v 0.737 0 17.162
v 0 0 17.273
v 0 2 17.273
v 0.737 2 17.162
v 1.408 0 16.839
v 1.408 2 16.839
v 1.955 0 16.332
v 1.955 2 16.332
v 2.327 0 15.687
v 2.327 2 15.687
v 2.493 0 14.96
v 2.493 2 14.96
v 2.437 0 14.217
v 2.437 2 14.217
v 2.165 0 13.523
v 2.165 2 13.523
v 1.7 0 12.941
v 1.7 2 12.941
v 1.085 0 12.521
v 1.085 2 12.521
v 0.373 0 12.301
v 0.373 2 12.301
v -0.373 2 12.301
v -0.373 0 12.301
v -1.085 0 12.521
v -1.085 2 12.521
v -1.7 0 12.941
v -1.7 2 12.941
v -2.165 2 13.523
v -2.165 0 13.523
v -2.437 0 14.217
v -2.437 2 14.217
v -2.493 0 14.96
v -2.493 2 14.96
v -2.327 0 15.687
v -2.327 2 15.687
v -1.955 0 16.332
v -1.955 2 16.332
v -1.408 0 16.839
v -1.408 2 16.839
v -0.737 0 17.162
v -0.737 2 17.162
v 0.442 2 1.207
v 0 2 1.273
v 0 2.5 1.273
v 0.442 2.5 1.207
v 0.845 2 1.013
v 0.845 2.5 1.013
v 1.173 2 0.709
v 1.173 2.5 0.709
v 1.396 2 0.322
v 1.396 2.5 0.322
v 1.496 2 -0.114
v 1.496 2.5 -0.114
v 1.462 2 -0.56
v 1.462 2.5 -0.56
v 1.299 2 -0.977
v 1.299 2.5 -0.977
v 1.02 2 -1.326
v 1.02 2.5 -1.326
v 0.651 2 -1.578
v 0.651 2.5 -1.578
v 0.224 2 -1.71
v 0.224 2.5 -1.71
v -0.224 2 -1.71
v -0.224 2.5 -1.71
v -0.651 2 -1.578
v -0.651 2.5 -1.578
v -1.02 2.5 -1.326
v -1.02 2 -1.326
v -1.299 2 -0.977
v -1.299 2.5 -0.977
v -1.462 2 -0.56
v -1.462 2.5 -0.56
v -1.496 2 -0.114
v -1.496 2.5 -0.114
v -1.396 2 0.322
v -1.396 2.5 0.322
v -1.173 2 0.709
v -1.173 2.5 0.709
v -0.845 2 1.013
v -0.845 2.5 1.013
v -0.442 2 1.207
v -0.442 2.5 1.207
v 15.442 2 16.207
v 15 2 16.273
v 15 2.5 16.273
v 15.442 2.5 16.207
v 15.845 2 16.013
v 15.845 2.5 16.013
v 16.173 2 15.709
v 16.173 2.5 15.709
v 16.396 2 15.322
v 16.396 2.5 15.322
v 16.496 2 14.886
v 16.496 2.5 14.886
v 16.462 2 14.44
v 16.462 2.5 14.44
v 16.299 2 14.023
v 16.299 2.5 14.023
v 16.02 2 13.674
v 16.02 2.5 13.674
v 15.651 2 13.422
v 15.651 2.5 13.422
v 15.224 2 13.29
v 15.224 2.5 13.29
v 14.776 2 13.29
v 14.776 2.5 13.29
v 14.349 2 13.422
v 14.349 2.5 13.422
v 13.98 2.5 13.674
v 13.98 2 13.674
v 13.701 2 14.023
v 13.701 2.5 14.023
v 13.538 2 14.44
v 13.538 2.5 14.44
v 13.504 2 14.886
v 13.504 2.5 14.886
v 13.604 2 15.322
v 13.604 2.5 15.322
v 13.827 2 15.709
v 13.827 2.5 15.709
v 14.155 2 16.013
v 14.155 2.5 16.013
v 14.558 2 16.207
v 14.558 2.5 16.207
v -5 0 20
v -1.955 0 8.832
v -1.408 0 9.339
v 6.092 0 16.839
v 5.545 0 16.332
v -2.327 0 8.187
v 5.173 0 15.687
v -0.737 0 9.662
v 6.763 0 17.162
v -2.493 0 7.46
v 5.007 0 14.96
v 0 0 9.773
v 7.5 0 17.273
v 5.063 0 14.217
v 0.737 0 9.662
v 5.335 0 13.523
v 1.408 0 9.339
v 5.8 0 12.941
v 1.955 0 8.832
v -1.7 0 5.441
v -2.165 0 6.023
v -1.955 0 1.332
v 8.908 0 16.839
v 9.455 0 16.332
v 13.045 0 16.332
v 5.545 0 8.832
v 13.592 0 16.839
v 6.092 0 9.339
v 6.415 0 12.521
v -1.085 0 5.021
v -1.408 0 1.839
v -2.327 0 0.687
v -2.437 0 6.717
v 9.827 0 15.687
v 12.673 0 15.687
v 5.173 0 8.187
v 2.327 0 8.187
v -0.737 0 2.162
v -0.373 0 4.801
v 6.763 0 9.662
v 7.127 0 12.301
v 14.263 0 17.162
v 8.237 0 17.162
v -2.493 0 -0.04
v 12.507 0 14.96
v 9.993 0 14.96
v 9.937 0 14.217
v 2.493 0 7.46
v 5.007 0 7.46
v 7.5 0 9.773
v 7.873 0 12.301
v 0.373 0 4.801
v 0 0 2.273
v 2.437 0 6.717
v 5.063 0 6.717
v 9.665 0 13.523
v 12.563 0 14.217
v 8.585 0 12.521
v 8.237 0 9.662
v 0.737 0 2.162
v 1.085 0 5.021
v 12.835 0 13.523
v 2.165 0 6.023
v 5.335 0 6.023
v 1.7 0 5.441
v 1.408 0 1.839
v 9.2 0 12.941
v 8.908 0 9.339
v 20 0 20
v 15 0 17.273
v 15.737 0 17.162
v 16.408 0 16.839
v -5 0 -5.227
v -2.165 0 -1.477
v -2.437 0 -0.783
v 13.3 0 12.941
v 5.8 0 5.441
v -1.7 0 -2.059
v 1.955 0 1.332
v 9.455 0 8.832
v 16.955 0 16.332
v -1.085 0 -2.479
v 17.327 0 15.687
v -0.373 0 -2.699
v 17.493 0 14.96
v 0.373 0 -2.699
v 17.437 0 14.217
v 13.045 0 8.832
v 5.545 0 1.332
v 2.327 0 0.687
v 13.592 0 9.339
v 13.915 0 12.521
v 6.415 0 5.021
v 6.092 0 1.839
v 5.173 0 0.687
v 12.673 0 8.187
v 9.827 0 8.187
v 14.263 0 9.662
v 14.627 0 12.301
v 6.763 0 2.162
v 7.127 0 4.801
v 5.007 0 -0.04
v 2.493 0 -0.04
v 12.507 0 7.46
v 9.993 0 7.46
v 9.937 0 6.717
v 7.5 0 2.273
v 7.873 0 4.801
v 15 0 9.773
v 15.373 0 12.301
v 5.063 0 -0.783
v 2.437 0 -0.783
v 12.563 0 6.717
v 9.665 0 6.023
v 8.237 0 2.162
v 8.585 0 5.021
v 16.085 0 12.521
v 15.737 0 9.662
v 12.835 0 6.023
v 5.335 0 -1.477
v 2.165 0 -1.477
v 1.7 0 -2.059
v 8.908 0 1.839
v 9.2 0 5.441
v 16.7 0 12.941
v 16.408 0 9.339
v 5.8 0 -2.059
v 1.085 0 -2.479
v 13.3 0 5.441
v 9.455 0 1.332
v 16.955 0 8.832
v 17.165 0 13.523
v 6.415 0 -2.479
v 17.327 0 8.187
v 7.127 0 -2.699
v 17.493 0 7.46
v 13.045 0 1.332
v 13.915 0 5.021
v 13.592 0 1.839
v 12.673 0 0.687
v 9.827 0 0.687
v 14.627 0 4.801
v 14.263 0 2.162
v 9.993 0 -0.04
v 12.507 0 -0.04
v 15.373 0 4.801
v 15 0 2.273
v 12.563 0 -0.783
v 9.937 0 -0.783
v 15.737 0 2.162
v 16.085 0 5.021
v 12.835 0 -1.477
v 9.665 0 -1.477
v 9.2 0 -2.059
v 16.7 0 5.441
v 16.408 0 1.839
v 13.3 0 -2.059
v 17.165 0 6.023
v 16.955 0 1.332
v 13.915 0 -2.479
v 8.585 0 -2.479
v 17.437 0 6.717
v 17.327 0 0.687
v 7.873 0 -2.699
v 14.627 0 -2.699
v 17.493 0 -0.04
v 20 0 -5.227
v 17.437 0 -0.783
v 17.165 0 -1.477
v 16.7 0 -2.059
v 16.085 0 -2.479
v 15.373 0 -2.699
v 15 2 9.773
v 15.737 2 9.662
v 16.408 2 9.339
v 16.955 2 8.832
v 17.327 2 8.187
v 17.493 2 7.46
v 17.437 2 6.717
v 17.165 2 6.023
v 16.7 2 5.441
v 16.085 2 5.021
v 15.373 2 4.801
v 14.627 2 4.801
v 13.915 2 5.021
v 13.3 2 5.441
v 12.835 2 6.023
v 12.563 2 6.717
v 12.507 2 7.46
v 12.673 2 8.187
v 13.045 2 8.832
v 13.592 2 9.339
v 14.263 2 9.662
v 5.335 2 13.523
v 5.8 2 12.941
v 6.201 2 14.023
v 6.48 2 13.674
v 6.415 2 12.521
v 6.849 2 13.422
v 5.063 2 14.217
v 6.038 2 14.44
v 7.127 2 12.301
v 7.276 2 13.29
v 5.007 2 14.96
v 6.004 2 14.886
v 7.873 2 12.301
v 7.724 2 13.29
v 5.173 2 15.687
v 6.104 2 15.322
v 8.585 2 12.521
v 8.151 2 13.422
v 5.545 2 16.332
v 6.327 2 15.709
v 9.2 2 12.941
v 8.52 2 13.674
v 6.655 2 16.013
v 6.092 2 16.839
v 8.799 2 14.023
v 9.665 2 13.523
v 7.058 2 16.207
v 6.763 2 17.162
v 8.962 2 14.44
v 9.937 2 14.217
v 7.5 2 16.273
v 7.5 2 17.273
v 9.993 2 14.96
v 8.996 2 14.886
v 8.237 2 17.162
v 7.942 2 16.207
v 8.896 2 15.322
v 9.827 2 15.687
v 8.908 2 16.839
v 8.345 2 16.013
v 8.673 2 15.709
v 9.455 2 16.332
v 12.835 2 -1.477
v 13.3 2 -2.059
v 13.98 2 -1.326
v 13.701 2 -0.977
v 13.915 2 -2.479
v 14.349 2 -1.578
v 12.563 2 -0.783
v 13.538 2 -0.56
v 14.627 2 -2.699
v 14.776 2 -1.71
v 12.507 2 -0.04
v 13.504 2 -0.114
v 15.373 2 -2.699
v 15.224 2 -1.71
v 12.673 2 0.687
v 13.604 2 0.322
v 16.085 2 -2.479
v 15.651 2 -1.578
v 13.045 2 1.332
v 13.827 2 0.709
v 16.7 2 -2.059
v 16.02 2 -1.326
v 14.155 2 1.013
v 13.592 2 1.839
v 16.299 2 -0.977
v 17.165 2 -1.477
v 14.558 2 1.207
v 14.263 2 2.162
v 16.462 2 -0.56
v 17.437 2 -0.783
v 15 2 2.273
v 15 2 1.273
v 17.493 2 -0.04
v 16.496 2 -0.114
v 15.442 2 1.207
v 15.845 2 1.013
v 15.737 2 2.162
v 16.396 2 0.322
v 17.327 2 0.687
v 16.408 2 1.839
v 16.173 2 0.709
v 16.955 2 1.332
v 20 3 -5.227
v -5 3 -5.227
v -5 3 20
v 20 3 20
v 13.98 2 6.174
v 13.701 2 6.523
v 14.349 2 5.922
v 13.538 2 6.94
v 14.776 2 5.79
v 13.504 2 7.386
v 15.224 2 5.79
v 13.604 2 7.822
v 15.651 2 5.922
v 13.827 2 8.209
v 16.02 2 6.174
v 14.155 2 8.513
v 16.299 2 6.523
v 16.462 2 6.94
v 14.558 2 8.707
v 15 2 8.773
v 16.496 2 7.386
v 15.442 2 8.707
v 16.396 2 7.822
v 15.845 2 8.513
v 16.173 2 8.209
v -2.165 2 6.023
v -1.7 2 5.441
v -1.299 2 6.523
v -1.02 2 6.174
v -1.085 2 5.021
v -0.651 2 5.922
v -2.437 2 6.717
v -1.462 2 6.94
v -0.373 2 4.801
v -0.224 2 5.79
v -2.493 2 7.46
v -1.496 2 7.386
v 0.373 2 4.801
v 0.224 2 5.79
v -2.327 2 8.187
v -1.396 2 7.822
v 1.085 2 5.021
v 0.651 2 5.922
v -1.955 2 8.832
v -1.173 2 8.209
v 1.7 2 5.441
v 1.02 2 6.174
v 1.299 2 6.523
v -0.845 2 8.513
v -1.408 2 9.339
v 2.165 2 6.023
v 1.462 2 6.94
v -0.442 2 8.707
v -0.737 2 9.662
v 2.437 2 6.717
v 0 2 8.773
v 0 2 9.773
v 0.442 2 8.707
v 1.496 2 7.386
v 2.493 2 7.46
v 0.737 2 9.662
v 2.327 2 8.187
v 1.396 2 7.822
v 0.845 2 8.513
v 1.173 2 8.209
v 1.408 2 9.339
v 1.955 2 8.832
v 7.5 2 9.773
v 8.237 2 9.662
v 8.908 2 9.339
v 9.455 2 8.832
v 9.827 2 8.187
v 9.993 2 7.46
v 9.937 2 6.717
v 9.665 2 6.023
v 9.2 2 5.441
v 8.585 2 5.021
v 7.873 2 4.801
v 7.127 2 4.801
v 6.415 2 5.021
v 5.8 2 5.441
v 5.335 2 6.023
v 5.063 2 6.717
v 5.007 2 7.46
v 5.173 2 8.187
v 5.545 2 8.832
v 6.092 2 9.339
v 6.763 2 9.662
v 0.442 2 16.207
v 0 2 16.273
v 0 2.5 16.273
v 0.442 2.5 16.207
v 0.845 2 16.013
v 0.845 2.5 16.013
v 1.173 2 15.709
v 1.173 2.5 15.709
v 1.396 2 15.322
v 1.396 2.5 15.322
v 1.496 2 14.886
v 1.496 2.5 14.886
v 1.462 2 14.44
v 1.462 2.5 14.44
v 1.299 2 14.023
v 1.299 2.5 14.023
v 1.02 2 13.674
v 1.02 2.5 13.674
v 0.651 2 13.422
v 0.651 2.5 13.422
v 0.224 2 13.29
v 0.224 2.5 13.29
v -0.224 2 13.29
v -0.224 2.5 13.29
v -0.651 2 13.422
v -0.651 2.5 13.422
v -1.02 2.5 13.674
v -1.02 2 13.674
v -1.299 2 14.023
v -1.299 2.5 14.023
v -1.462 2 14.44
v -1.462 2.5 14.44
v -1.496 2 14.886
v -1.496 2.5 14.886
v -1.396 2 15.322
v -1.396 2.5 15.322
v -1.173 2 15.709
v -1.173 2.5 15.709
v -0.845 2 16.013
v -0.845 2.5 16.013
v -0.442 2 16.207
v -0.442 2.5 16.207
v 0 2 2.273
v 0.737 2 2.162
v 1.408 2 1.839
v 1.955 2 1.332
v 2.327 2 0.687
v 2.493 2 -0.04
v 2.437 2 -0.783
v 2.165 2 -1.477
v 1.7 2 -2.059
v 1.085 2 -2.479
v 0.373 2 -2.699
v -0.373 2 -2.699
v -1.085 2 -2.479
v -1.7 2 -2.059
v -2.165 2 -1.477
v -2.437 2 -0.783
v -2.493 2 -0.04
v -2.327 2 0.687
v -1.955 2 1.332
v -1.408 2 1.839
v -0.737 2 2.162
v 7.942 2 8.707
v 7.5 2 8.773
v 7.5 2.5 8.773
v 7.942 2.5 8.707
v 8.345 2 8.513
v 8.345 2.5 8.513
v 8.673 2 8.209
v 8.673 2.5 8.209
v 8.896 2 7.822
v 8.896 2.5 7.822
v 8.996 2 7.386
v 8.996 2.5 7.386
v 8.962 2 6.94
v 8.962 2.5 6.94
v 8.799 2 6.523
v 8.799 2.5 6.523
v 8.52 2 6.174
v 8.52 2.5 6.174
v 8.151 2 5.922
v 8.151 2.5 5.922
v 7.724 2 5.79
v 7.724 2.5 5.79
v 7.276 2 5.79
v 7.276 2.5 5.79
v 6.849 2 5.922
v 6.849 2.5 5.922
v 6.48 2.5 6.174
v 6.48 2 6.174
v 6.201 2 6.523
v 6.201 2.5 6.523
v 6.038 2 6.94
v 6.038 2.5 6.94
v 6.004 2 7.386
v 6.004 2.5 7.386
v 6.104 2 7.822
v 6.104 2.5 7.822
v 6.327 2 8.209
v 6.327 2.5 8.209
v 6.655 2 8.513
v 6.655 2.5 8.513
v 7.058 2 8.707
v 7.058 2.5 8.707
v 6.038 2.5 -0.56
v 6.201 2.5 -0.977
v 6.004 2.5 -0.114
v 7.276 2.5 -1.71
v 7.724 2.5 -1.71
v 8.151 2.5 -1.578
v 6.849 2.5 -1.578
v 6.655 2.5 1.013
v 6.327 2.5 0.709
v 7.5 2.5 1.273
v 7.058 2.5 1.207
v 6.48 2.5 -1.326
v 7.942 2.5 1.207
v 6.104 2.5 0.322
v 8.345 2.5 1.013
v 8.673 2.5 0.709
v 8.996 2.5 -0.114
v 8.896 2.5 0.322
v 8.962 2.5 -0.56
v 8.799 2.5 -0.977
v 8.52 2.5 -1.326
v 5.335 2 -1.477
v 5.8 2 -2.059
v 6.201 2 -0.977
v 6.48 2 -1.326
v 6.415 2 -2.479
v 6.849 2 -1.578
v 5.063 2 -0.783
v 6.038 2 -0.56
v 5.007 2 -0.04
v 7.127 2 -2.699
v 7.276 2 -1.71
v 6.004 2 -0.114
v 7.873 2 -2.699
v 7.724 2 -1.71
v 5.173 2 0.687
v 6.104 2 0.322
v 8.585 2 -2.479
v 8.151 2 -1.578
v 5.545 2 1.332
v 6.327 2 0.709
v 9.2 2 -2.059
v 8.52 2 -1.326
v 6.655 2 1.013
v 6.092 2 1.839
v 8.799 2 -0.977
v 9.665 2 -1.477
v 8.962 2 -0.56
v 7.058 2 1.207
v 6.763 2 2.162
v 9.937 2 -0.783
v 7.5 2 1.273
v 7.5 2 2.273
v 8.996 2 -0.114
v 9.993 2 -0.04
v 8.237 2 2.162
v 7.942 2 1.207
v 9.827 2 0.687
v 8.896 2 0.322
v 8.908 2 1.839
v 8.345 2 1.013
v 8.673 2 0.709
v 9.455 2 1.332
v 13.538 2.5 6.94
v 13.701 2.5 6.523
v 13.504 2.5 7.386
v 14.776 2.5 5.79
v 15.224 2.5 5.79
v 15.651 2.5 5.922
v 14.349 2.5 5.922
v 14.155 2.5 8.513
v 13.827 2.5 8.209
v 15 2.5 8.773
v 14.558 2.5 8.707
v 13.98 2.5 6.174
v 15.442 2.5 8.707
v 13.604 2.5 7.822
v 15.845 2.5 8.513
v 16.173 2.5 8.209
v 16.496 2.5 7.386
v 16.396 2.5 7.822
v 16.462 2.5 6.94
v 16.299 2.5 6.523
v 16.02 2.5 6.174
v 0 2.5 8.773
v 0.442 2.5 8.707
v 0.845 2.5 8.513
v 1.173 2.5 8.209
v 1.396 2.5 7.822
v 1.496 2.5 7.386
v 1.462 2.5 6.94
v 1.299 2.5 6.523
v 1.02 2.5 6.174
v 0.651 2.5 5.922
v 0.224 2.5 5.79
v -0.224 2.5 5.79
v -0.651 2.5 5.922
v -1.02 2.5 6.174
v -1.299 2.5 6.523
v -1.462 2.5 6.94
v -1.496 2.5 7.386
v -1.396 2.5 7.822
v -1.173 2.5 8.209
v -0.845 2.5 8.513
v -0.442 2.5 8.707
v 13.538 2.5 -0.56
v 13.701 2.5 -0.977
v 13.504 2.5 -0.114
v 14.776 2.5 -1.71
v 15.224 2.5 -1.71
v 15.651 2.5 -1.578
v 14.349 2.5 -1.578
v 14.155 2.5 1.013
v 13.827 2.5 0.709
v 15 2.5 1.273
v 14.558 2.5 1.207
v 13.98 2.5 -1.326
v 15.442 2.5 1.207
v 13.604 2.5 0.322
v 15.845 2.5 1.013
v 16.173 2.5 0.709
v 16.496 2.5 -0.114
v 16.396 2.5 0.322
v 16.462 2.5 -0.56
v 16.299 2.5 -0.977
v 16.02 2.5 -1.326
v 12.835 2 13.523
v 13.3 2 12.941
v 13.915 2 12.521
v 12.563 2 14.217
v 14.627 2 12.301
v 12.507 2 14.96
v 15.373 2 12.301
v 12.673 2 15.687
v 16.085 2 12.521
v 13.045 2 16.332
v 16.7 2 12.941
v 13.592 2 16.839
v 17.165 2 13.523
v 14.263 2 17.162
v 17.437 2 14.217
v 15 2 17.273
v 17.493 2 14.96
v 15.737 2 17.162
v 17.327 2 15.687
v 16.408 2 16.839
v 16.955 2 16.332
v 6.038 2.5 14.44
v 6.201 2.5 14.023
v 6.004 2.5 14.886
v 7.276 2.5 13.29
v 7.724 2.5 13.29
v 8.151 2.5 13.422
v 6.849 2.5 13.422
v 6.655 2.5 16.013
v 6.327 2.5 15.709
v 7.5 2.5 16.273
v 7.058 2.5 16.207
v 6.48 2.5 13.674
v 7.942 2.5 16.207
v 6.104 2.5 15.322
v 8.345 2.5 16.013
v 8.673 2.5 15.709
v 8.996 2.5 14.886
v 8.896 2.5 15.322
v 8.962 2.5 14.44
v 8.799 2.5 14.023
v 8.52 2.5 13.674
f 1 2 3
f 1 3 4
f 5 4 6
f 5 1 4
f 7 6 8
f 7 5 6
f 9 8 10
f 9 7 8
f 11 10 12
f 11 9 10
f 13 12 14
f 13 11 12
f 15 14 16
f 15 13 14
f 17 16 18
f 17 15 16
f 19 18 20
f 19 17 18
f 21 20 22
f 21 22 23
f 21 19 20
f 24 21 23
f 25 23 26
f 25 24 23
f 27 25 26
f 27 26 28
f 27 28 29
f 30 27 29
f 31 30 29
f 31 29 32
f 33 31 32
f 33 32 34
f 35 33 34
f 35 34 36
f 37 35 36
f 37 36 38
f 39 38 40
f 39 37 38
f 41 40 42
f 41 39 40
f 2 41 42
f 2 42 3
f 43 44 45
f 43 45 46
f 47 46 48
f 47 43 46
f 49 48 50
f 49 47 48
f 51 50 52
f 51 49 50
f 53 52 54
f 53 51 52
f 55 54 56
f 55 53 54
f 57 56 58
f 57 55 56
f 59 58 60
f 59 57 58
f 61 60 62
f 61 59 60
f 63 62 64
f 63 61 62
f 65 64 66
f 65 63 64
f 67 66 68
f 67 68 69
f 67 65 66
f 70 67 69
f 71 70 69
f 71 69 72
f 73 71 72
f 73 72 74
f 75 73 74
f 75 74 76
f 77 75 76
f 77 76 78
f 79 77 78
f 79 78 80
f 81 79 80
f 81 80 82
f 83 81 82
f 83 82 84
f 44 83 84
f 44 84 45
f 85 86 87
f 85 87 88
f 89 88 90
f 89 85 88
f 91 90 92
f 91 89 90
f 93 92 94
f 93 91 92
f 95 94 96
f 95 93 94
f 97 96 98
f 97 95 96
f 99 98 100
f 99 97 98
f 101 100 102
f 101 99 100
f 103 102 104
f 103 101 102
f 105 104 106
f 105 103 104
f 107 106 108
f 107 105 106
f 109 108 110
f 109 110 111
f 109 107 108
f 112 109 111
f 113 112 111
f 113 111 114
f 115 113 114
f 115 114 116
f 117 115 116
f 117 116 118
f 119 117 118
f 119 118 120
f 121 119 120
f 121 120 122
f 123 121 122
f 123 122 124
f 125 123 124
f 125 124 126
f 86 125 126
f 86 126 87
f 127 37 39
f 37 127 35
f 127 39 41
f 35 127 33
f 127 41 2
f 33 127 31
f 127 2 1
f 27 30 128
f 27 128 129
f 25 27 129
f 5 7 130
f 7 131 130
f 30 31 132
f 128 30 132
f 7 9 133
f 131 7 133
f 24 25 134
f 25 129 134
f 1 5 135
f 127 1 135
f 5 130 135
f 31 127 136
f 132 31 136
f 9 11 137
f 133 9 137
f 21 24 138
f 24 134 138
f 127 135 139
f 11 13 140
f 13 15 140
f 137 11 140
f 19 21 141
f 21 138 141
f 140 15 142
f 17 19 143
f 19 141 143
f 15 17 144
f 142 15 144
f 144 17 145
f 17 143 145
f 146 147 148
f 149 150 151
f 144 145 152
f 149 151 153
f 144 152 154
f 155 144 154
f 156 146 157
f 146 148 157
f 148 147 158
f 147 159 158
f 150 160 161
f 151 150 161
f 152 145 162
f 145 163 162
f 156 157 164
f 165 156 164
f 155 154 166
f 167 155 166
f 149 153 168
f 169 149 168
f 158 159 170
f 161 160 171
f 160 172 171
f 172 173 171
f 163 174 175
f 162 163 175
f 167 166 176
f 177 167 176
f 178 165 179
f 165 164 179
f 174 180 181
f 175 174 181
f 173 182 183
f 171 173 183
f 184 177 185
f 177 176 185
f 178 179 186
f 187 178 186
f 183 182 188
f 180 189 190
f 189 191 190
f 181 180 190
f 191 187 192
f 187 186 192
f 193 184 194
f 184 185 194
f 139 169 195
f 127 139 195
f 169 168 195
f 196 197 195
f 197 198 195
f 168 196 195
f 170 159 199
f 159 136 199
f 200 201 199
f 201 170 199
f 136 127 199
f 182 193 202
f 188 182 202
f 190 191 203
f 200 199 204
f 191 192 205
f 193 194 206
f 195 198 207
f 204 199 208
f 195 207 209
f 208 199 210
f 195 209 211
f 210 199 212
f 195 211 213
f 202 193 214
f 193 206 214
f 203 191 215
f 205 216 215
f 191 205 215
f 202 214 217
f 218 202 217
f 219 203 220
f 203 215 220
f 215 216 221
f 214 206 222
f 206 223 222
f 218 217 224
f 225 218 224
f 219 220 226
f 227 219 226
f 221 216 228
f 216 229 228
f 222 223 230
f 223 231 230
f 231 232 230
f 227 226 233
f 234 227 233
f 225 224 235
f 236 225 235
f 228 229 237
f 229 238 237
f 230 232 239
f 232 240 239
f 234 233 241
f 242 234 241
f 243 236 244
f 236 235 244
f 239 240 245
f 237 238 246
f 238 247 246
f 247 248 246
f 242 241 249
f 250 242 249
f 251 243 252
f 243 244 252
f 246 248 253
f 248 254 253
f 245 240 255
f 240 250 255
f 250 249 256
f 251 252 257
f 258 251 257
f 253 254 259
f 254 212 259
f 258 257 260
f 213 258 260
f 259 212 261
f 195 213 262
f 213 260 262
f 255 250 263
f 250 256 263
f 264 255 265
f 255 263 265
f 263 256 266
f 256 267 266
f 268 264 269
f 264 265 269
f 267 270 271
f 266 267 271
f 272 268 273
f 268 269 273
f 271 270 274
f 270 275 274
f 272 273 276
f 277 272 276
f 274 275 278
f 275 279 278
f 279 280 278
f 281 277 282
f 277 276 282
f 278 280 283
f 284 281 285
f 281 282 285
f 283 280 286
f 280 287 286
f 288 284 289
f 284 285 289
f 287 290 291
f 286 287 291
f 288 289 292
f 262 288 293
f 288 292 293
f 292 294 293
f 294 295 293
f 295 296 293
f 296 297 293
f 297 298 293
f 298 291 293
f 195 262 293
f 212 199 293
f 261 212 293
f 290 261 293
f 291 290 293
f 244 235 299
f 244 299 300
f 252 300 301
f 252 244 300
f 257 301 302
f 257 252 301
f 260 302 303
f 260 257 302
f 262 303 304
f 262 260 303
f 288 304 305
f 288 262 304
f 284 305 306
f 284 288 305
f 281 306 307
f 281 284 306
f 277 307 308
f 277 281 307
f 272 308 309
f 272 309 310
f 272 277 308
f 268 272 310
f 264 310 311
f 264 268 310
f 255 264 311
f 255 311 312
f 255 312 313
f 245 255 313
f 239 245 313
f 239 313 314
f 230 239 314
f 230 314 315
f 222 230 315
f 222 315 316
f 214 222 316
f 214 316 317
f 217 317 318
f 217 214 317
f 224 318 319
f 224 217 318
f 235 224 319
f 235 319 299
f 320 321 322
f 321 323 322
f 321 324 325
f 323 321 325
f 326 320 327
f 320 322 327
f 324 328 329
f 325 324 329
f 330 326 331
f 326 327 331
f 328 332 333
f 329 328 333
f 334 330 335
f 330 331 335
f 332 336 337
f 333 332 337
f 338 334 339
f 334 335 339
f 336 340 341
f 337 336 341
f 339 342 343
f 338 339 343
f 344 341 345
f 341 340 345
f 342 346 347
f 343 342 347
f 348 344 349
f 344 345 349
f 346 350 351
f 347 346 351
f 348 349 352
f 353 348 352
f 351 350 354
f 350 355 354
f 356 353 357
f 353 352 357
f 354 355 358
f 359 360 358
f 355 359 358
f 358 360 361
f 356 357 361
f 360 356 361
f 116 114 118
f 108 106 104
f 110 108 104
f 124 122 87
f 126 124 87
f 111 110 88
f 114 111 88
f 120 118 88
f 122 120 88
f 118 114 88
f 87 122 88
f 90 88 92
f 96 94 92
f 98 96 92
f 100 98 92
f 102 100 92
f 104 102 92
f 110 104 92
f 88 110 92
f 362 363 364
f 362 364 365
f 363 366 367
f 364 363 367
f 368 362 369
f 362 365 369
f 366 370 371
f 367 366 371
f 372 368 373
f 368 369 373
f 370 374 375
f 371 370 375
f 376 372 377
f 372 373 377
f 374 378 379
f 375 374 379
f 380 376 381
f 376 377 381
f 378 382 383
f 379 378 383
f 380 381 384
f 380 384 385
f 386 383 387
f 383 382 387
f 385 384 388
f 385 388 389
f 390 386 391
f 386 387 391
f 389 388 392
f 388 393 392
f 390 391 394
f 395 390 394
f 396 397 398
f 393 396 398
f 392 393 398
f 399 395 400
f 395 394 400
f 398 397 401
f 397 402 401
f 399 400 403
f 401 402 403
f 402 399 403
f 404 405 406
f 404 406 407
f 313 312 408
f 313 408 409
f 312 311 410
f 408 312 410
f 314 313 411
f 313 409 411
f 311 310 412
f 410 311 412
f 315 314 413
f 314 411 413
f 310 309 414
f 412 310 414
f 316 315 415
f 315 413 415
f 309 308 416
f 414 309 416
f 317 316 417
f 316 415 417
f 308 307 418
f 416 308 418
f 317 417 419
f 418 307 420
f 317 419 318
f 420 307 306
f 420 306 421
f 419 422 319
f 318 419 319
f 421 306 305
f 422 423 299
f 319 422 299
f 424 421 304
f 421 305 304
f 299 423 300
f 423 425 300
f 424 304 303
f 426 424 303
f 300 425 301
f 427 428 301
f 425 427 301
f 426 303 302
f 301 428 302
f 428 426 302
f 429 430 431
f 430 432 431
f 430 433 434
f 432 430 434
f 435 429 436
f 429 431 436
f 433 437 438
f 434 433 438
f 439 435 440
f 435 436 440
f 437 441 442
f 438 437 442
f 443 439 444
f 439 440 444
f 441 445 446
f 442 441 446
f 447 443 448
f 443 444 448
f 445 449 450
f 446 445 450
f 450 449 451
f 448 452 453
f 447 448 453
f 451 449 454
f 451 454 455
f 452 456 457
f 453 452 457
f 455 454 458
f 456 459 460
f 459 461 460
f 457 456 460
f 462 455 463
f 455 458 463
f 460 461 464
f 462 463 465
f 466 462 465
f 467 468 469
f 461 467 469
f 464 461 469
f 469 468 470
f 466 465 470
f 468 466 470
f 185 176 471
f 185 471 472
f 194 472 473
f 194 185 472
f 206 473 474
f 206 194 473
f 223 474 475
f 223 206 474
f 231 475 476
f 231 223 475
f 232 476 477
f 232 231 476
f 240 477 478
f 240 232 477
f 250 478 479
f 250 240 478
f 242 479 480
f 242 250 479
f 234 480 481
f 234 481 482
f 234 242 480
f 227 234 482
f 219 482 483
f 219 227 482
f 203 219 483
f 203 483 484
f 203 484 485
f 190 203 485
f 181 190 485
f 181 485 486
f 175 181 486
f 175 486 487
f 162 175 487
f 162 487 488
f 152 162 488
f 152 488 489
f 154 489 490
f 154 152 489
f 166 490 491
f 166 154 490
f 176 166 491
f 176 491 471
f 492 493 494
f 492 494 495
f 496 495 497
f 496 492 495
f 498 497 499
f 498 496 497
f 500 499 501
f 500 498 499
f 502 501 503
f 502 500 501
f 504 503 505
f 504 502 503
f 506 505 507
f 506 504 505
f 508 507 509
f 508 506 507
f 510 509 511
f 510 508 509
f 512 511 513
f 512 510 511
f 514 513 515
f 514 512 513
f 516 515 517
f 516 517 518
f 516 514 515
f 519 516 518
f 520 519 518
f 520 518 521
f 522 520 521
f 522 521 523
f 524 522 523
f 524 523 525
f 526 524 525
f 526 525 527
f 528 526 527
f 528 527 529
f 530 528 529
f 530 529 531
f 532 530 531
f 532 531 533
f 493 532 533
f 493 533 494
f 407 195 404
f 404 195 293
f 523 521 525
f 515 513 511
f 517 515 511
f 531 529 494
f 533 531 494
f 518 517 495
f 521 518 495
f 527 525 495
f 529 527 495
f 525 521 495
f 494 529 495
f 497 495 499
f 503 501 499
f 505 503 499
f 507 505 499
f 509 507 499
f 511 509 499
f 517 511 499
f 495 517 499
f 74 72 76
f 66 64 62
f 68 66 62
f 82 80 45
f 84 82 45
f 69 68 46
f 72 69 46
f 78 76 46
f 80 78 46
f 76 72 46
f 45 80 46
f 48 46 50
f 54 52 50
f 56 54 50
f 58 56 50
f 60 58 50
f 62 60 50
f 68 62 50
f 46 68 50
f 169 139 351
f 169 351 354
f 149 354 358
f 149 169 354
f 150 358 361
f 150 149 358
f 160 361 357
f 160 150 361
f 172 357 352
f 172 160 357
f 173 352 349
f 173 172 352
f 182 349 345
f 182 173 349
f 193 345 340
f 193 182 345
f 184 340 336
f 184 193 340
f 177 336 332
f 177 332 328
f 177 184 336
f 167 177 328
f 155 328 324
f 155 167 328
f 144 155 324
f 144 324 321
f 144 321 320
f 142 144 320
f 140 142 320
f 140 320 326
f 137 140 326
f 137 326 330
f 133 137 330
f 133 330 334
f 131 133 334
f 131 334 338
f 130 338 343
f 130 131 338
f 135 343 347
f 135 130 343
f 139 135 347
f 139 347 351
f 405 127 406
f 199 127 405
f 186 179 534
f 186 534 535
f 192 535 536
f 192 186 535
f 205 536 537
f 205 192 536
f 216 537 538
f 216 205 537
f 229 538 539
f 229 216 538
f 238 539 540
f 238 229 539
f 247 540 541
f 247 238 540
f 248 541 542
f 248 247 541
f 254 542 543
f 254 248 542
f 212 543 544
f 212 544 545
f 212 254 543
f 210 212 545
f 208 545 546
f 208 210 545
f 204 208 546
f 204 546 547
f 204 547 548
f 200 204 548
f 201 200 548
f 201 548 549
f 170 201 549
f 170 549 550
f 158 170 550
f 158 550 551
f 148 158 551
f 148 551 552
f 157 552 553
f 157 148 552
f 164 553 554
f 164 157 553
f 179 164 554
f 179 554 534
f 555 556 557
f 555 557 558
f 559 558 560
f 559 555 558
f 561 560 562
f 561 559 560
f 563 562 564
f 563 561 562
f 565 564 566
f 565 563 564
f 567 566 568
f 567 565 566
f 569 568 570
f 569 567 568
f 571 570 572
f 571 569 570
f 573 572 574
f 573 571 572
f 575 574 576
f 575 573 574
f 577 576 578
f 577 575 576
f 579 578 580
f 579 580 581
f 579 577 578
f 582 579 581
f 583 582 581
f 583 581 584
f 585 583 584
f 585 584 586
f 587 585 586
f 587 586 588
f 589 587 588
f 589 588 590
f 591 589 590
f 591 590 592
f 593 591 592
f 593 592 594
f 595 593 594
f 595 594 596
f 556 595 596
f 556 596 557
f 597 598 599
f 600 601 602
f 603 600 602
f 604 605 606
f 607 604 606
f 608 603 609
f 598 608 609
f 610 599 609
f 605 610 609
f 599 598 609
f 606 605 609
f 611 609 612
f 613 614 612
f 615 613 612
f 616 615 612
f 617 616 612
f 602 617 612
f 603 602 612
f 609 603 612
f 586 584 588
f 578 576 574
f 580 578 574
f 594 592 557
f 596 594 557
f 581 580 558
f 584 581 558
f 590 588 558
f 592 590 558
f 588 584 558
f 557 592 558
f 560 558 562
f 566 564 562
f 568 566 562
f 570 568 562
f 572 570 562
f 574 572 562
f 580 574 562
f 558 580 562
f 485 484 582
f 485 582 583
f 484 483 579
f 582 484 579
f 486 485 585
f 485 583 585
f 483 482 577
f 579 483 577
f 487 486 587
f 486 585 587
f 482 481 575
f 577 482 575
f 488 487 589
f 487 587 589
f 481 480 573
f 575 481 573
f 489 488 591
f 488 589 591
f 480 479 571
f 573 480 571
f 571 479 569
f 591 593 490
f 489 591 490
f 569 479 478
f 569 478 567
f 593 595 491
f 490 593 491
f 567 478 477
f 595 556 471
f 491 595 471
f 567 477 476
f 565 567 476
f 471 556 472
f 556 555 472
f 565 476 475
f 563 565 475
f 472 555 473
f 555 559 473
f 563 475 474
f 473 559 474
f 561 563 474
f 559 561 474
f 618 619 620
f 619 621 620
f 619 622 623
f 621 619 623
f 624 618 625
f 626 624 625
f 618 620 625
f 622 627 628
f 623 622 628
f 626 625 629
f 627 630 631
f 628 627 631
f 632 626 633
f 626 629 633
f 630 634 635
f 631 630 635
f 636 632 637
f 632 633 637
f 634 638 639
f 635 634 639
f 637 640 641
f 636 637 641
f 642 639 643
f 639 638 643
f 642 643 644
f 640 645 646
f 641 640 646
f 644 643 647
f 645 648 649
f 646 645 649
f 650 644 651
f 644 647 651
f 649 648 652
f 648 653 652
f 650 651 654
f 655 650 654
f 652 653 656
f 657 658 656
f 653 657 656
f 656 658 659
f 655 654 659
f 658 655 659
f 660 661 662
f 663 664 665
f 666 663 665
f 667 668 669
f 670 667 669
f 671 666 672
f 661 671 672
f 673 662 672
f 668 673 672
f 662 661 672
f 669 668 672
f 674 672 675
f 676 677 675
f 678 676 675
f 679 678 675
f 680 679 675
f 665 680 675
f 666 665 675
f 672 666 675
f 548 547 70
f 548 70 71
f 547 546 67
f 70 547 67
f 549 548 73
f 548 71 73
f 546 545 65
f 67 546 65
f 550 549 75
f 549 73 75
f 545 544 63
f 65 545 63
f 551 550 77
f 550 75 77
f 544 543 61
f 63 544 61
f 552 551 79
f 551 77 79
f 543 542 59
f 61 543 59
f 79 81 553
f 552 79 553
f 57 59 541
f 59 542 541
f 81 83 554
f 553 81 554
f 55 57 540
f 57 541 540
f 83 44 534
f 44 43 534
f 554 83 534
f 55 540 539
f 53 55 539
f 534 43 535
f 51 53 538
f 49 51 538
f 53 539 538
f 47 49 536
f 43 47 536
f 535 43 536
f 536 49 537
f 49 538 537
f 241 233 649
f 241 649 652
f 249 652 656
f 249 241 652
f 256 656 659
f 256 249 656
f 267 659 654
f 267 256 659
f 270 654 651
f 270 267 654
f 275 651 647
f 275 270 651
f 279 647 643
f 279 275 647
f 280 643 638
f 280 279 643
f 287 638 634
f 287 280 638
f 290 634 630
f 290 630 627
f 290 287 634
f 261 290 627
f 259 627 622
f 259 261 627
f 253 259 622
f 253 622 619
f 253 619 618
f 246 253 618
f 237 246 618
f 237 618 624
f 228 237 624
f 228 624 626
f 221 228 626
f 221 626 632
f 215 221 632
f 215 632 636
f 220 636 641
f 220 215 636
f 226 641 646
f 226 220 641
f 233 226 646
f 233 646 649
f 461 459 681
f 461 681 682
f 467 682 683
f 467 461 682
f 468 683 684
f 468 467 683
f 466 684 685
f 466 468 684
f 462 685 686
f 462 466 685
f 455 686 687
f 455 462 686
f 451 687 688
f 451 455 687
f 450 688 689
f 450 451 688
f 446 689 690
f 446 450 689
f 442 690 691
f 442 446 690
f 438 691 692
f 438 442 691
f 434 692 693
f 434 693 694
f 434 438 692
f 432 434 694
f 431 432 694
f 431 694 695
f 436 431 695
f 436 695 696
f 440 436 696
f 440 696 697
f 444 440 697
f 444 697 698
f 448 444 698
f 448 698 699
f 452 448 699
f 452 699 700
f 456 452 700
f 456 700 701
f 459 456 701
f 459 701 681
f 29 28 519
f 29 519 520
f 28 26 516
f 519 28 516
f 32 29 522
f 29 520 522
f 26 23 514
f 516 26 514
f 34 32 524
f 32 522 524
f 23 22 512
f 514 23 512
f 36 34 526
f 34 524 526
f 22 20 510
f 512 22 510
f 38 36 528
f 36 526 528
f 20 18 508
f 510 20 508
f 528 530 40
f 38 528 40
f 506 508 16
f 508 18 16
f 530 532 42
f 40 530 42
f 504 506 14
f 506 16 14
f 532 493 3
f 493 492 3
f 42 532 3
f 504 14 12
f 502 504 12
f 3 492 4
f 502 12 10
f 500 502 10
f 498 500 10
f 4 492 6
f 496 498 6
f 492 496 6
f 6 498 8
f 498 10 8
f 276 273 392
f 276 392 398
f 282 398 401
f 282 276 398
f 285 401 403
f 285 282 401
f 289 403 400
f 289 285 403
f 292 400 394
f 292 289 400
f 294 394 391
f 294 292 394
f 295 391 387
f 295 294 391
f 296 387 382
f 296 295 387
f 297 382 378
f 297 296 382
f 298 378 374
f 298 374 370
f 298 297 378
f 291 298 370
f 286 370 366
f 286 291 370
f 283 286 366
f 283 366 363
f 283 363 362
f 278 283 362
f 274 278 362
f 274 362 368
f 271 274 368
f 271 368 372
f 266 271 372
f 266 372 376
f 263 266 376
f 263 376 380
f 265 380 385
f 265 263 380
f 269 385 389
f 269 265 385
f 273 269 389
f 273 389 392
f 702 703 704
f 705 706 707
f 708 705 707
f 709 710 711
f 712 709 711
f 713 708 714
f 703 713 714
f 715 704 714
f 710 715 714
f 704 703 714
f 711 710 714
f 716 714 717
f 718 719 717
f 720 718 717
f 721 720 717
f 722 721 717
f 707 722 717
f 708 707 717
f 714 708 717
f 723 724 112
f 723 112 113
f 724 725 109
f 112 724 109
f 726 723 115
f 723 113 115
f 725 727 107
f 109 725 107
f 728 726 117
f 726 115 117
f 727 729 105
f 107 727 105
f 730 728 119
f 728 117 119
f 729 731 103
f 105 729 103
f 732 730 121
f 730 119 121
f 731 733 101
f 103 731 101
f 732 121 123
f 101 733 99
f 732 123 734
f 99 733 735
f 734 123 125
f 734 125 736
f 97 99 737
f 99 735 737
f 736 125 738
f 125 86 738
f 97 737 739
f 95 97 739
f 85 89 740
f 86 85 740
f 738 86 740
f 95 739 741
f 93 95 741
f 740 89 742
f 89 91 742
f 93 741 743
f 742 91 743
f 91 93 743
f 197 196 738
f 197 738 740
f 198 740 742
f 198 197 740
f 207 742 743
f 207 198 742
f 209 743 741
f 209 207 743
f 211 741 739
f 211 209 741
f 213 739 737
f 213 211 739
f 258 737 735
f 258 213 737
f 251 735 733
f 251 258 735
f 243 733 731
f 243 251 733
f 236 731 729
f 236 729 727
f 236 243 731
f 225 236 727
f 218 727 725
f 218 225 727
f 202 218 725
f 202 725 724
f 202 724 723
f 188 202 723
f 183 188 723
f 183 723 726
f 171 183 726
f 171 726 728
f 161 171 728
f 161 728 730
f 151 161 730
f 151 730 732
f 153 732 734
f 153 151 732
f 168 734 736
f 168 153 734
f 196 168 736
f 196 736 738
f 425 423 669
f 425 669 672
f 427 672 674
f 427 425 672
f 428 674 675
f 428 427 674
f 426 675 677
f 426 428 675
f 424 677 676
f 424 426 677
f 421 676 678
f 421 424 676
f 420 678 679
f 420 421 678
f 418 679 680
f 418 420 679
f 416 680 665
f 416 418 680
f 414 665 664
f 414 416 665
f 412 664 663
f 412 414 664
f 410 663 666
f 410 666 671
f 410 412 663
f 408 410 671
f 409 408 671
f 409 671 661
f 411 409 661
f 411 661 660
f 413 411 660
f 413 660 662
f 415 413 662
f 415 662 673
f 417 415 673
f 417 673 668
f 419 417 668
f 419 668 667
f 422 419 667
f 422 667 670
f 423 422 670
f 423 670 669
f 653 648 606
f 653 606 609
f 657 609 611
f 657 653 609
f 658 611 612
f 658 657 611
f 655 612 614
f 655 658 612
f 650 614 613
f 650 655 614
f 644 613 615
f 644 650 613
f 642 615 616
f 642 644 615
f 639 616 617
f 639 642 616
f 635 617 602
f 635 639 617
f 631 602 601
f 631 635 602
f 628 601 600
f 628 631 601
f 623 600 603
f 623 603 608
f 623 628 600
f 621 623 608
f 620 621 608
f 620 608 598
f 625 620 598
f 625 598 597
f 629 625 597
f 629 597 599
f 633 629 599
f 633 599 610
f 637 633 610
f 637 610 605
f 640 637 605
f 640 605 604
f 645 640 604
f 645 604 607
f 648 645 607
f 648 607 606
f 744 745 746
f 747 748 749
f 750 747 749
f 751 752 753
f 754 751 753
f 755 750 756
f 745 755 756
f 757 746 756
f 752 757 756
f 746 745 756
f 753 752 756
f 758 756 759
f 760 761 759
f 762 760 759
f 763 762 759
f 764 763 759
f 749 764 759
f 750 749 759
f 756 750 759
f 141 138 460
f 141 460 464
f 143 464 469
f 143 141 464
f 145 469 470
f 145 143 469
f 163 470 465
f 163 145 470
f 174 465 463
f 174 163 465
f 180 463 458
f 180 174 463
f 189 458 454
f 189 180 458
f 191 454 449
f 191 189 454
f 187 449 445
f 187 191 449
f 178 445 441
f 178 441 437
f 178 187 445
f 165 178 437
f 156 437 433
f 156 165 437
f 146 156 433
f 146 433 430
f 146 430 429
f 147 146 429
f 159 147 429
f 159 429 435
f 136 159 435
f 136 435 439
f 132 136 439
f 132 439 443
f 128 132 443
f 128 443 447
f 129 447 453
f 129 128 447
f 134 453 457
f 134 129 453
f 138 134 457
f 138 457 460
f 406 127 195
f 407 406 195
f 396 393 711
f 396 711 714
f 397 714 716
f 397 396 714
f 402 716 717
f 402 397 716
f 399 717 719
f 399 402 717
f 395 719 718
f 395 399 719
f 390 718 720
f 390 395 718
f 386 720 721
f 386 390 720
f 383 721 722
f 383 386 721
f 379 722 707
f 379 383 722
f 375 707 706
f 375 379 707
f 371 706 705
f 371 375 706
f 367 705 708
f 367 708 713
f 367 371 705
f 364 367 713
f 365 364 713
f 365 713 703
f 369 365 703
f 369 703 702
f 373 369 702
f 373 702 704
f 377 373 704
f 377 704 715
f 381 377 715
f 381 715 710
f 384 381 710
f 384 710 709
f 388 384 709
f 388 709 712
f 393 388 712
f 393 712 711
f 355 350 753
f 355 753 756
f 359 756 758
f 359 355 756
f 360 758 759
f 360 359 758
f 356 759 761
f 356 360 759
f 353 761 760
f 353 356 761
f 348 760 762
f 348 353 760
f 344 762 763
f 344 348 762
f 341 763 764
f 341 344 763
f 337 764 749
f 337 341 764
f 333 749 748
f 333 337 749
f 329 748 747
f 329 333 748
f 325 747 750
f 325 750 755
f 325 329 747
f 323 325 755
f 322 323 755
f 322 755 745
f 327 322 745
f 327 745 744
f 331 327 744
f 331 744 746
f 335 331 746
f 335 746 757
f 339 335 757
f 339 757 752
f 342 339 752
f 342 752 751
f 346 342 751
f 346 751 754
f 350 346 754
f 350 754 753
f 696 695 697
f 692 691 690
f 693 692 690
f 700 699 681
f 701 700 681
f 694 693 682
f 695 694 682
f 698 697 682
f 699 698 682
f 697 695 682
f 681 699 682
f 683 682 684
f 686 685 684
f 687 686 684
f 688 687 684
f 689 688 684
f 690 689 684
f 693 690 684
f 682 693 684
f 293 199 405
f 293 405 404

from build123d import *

# Parameters (mm, degrees)
SKETCH_1_W                  = 25
SKETCH_1_H                  = 25.22650516
EXTRUDE_1_DEPTH             = 3
SKETCH_1_3_R                = 2.5
CUT_EXTRUDE_1_DEPTH         = 2
PATTERN_LINEAR_1_COUNT      = 3
PATTERN_LINEAR_1_PITCH      = 7.5
PATTERN_LINEAR_1_COUNT_DIR2 = 3
PATTERN_LINEAR_1_PITCH_DIR2 = 7.5
SKETCH_1_4_R                = 1.5
CUT_EXTRUDE_2_DEPTH         = 2.5
PATTERN_LINEAR_2_COUNT      = 3
PATTERN_LINEAR_2_PITCH      = 7.5
PATTERN_LINEAR_2_COUNT_DIR2 = 3
PATTERN_LINEAR_2_PITCH_DIR2 = 7.5


with BuildPart() as part:
    # 草图1 → 凸台-拉伸1 (new body)
    with BuildSketch(Plane(origin=(0, 0, 0), x_dir=(1, 0, 0), z_dir=(0, 1, 0))):
        with Locations((7.5, -7.38674742)):
            Rectangle(SKETCH_1_W, SKETCH_1_H)
    extrude(amount=EXTRUDE_1_DEPTH)

    # 草图1<3> → 切除-拉伸1 (cut)
    with BuildSketch(Plane(origin=(0, 0, 0), x_dir=(1, 0, 0), z_dir=(0, 1, 0))):
        with Locations((15, -14.77349484)):
            Circle(SKETCH_1_3_R)
    cut_extrude_1 = extrude(amount=CUT_EXTRUDE_1_DEPTH, mode=Mode.SUBTRACT)

    # 阵列(线性)1: Cut-Extrude 1 3 × 3
    with Locations(*[(-j * PATTERN_LINEAR_1_PITCH_DIR2, 0, -i * PATTERN_LINEAR_1_PITCH) for i in range(PATTERN_LINEAR_1_COUNT) for j in range(PATTERN_LINEAR_1_COUNT_DIR2) if (i, j) != (0, 0)]):
        add(cut_extrude_1, mode=Mode.SUBTRACT)

    # 草图1<4> → 切除-拉伸2 (cut)
    with BuildSketch(Plane(origin=(0, 0, 0), x_dir=(1, 0, 0), z_dir=(0, 1, 0))):
        with Locations((15, -14.77349484)):
            Circle(SKETCH_1_4_R)
    cut_extrude_2 = extrude(amount=CUT_EXTRUDE_2_DEPTH, mode=Mode.SUBTRACT)

    # 阵列(线性)2: Cut-Extrude 2 3 × 3
    with Locations(*[(-j * PATTERN_LINEAR_2_PITCH_DIR2, 0, -i * PATTERN_LINEAR_2_PITCH) for i in range(PATTERN_LINEAR_2_COUNT) for j in range(PATTERN_LINEAR_2_COUNT_DIR2) if (i, j) != (0, 0)]):
        add(cut_extrude_2, mode=Mode.SUBTRACT)


solid = part.part
